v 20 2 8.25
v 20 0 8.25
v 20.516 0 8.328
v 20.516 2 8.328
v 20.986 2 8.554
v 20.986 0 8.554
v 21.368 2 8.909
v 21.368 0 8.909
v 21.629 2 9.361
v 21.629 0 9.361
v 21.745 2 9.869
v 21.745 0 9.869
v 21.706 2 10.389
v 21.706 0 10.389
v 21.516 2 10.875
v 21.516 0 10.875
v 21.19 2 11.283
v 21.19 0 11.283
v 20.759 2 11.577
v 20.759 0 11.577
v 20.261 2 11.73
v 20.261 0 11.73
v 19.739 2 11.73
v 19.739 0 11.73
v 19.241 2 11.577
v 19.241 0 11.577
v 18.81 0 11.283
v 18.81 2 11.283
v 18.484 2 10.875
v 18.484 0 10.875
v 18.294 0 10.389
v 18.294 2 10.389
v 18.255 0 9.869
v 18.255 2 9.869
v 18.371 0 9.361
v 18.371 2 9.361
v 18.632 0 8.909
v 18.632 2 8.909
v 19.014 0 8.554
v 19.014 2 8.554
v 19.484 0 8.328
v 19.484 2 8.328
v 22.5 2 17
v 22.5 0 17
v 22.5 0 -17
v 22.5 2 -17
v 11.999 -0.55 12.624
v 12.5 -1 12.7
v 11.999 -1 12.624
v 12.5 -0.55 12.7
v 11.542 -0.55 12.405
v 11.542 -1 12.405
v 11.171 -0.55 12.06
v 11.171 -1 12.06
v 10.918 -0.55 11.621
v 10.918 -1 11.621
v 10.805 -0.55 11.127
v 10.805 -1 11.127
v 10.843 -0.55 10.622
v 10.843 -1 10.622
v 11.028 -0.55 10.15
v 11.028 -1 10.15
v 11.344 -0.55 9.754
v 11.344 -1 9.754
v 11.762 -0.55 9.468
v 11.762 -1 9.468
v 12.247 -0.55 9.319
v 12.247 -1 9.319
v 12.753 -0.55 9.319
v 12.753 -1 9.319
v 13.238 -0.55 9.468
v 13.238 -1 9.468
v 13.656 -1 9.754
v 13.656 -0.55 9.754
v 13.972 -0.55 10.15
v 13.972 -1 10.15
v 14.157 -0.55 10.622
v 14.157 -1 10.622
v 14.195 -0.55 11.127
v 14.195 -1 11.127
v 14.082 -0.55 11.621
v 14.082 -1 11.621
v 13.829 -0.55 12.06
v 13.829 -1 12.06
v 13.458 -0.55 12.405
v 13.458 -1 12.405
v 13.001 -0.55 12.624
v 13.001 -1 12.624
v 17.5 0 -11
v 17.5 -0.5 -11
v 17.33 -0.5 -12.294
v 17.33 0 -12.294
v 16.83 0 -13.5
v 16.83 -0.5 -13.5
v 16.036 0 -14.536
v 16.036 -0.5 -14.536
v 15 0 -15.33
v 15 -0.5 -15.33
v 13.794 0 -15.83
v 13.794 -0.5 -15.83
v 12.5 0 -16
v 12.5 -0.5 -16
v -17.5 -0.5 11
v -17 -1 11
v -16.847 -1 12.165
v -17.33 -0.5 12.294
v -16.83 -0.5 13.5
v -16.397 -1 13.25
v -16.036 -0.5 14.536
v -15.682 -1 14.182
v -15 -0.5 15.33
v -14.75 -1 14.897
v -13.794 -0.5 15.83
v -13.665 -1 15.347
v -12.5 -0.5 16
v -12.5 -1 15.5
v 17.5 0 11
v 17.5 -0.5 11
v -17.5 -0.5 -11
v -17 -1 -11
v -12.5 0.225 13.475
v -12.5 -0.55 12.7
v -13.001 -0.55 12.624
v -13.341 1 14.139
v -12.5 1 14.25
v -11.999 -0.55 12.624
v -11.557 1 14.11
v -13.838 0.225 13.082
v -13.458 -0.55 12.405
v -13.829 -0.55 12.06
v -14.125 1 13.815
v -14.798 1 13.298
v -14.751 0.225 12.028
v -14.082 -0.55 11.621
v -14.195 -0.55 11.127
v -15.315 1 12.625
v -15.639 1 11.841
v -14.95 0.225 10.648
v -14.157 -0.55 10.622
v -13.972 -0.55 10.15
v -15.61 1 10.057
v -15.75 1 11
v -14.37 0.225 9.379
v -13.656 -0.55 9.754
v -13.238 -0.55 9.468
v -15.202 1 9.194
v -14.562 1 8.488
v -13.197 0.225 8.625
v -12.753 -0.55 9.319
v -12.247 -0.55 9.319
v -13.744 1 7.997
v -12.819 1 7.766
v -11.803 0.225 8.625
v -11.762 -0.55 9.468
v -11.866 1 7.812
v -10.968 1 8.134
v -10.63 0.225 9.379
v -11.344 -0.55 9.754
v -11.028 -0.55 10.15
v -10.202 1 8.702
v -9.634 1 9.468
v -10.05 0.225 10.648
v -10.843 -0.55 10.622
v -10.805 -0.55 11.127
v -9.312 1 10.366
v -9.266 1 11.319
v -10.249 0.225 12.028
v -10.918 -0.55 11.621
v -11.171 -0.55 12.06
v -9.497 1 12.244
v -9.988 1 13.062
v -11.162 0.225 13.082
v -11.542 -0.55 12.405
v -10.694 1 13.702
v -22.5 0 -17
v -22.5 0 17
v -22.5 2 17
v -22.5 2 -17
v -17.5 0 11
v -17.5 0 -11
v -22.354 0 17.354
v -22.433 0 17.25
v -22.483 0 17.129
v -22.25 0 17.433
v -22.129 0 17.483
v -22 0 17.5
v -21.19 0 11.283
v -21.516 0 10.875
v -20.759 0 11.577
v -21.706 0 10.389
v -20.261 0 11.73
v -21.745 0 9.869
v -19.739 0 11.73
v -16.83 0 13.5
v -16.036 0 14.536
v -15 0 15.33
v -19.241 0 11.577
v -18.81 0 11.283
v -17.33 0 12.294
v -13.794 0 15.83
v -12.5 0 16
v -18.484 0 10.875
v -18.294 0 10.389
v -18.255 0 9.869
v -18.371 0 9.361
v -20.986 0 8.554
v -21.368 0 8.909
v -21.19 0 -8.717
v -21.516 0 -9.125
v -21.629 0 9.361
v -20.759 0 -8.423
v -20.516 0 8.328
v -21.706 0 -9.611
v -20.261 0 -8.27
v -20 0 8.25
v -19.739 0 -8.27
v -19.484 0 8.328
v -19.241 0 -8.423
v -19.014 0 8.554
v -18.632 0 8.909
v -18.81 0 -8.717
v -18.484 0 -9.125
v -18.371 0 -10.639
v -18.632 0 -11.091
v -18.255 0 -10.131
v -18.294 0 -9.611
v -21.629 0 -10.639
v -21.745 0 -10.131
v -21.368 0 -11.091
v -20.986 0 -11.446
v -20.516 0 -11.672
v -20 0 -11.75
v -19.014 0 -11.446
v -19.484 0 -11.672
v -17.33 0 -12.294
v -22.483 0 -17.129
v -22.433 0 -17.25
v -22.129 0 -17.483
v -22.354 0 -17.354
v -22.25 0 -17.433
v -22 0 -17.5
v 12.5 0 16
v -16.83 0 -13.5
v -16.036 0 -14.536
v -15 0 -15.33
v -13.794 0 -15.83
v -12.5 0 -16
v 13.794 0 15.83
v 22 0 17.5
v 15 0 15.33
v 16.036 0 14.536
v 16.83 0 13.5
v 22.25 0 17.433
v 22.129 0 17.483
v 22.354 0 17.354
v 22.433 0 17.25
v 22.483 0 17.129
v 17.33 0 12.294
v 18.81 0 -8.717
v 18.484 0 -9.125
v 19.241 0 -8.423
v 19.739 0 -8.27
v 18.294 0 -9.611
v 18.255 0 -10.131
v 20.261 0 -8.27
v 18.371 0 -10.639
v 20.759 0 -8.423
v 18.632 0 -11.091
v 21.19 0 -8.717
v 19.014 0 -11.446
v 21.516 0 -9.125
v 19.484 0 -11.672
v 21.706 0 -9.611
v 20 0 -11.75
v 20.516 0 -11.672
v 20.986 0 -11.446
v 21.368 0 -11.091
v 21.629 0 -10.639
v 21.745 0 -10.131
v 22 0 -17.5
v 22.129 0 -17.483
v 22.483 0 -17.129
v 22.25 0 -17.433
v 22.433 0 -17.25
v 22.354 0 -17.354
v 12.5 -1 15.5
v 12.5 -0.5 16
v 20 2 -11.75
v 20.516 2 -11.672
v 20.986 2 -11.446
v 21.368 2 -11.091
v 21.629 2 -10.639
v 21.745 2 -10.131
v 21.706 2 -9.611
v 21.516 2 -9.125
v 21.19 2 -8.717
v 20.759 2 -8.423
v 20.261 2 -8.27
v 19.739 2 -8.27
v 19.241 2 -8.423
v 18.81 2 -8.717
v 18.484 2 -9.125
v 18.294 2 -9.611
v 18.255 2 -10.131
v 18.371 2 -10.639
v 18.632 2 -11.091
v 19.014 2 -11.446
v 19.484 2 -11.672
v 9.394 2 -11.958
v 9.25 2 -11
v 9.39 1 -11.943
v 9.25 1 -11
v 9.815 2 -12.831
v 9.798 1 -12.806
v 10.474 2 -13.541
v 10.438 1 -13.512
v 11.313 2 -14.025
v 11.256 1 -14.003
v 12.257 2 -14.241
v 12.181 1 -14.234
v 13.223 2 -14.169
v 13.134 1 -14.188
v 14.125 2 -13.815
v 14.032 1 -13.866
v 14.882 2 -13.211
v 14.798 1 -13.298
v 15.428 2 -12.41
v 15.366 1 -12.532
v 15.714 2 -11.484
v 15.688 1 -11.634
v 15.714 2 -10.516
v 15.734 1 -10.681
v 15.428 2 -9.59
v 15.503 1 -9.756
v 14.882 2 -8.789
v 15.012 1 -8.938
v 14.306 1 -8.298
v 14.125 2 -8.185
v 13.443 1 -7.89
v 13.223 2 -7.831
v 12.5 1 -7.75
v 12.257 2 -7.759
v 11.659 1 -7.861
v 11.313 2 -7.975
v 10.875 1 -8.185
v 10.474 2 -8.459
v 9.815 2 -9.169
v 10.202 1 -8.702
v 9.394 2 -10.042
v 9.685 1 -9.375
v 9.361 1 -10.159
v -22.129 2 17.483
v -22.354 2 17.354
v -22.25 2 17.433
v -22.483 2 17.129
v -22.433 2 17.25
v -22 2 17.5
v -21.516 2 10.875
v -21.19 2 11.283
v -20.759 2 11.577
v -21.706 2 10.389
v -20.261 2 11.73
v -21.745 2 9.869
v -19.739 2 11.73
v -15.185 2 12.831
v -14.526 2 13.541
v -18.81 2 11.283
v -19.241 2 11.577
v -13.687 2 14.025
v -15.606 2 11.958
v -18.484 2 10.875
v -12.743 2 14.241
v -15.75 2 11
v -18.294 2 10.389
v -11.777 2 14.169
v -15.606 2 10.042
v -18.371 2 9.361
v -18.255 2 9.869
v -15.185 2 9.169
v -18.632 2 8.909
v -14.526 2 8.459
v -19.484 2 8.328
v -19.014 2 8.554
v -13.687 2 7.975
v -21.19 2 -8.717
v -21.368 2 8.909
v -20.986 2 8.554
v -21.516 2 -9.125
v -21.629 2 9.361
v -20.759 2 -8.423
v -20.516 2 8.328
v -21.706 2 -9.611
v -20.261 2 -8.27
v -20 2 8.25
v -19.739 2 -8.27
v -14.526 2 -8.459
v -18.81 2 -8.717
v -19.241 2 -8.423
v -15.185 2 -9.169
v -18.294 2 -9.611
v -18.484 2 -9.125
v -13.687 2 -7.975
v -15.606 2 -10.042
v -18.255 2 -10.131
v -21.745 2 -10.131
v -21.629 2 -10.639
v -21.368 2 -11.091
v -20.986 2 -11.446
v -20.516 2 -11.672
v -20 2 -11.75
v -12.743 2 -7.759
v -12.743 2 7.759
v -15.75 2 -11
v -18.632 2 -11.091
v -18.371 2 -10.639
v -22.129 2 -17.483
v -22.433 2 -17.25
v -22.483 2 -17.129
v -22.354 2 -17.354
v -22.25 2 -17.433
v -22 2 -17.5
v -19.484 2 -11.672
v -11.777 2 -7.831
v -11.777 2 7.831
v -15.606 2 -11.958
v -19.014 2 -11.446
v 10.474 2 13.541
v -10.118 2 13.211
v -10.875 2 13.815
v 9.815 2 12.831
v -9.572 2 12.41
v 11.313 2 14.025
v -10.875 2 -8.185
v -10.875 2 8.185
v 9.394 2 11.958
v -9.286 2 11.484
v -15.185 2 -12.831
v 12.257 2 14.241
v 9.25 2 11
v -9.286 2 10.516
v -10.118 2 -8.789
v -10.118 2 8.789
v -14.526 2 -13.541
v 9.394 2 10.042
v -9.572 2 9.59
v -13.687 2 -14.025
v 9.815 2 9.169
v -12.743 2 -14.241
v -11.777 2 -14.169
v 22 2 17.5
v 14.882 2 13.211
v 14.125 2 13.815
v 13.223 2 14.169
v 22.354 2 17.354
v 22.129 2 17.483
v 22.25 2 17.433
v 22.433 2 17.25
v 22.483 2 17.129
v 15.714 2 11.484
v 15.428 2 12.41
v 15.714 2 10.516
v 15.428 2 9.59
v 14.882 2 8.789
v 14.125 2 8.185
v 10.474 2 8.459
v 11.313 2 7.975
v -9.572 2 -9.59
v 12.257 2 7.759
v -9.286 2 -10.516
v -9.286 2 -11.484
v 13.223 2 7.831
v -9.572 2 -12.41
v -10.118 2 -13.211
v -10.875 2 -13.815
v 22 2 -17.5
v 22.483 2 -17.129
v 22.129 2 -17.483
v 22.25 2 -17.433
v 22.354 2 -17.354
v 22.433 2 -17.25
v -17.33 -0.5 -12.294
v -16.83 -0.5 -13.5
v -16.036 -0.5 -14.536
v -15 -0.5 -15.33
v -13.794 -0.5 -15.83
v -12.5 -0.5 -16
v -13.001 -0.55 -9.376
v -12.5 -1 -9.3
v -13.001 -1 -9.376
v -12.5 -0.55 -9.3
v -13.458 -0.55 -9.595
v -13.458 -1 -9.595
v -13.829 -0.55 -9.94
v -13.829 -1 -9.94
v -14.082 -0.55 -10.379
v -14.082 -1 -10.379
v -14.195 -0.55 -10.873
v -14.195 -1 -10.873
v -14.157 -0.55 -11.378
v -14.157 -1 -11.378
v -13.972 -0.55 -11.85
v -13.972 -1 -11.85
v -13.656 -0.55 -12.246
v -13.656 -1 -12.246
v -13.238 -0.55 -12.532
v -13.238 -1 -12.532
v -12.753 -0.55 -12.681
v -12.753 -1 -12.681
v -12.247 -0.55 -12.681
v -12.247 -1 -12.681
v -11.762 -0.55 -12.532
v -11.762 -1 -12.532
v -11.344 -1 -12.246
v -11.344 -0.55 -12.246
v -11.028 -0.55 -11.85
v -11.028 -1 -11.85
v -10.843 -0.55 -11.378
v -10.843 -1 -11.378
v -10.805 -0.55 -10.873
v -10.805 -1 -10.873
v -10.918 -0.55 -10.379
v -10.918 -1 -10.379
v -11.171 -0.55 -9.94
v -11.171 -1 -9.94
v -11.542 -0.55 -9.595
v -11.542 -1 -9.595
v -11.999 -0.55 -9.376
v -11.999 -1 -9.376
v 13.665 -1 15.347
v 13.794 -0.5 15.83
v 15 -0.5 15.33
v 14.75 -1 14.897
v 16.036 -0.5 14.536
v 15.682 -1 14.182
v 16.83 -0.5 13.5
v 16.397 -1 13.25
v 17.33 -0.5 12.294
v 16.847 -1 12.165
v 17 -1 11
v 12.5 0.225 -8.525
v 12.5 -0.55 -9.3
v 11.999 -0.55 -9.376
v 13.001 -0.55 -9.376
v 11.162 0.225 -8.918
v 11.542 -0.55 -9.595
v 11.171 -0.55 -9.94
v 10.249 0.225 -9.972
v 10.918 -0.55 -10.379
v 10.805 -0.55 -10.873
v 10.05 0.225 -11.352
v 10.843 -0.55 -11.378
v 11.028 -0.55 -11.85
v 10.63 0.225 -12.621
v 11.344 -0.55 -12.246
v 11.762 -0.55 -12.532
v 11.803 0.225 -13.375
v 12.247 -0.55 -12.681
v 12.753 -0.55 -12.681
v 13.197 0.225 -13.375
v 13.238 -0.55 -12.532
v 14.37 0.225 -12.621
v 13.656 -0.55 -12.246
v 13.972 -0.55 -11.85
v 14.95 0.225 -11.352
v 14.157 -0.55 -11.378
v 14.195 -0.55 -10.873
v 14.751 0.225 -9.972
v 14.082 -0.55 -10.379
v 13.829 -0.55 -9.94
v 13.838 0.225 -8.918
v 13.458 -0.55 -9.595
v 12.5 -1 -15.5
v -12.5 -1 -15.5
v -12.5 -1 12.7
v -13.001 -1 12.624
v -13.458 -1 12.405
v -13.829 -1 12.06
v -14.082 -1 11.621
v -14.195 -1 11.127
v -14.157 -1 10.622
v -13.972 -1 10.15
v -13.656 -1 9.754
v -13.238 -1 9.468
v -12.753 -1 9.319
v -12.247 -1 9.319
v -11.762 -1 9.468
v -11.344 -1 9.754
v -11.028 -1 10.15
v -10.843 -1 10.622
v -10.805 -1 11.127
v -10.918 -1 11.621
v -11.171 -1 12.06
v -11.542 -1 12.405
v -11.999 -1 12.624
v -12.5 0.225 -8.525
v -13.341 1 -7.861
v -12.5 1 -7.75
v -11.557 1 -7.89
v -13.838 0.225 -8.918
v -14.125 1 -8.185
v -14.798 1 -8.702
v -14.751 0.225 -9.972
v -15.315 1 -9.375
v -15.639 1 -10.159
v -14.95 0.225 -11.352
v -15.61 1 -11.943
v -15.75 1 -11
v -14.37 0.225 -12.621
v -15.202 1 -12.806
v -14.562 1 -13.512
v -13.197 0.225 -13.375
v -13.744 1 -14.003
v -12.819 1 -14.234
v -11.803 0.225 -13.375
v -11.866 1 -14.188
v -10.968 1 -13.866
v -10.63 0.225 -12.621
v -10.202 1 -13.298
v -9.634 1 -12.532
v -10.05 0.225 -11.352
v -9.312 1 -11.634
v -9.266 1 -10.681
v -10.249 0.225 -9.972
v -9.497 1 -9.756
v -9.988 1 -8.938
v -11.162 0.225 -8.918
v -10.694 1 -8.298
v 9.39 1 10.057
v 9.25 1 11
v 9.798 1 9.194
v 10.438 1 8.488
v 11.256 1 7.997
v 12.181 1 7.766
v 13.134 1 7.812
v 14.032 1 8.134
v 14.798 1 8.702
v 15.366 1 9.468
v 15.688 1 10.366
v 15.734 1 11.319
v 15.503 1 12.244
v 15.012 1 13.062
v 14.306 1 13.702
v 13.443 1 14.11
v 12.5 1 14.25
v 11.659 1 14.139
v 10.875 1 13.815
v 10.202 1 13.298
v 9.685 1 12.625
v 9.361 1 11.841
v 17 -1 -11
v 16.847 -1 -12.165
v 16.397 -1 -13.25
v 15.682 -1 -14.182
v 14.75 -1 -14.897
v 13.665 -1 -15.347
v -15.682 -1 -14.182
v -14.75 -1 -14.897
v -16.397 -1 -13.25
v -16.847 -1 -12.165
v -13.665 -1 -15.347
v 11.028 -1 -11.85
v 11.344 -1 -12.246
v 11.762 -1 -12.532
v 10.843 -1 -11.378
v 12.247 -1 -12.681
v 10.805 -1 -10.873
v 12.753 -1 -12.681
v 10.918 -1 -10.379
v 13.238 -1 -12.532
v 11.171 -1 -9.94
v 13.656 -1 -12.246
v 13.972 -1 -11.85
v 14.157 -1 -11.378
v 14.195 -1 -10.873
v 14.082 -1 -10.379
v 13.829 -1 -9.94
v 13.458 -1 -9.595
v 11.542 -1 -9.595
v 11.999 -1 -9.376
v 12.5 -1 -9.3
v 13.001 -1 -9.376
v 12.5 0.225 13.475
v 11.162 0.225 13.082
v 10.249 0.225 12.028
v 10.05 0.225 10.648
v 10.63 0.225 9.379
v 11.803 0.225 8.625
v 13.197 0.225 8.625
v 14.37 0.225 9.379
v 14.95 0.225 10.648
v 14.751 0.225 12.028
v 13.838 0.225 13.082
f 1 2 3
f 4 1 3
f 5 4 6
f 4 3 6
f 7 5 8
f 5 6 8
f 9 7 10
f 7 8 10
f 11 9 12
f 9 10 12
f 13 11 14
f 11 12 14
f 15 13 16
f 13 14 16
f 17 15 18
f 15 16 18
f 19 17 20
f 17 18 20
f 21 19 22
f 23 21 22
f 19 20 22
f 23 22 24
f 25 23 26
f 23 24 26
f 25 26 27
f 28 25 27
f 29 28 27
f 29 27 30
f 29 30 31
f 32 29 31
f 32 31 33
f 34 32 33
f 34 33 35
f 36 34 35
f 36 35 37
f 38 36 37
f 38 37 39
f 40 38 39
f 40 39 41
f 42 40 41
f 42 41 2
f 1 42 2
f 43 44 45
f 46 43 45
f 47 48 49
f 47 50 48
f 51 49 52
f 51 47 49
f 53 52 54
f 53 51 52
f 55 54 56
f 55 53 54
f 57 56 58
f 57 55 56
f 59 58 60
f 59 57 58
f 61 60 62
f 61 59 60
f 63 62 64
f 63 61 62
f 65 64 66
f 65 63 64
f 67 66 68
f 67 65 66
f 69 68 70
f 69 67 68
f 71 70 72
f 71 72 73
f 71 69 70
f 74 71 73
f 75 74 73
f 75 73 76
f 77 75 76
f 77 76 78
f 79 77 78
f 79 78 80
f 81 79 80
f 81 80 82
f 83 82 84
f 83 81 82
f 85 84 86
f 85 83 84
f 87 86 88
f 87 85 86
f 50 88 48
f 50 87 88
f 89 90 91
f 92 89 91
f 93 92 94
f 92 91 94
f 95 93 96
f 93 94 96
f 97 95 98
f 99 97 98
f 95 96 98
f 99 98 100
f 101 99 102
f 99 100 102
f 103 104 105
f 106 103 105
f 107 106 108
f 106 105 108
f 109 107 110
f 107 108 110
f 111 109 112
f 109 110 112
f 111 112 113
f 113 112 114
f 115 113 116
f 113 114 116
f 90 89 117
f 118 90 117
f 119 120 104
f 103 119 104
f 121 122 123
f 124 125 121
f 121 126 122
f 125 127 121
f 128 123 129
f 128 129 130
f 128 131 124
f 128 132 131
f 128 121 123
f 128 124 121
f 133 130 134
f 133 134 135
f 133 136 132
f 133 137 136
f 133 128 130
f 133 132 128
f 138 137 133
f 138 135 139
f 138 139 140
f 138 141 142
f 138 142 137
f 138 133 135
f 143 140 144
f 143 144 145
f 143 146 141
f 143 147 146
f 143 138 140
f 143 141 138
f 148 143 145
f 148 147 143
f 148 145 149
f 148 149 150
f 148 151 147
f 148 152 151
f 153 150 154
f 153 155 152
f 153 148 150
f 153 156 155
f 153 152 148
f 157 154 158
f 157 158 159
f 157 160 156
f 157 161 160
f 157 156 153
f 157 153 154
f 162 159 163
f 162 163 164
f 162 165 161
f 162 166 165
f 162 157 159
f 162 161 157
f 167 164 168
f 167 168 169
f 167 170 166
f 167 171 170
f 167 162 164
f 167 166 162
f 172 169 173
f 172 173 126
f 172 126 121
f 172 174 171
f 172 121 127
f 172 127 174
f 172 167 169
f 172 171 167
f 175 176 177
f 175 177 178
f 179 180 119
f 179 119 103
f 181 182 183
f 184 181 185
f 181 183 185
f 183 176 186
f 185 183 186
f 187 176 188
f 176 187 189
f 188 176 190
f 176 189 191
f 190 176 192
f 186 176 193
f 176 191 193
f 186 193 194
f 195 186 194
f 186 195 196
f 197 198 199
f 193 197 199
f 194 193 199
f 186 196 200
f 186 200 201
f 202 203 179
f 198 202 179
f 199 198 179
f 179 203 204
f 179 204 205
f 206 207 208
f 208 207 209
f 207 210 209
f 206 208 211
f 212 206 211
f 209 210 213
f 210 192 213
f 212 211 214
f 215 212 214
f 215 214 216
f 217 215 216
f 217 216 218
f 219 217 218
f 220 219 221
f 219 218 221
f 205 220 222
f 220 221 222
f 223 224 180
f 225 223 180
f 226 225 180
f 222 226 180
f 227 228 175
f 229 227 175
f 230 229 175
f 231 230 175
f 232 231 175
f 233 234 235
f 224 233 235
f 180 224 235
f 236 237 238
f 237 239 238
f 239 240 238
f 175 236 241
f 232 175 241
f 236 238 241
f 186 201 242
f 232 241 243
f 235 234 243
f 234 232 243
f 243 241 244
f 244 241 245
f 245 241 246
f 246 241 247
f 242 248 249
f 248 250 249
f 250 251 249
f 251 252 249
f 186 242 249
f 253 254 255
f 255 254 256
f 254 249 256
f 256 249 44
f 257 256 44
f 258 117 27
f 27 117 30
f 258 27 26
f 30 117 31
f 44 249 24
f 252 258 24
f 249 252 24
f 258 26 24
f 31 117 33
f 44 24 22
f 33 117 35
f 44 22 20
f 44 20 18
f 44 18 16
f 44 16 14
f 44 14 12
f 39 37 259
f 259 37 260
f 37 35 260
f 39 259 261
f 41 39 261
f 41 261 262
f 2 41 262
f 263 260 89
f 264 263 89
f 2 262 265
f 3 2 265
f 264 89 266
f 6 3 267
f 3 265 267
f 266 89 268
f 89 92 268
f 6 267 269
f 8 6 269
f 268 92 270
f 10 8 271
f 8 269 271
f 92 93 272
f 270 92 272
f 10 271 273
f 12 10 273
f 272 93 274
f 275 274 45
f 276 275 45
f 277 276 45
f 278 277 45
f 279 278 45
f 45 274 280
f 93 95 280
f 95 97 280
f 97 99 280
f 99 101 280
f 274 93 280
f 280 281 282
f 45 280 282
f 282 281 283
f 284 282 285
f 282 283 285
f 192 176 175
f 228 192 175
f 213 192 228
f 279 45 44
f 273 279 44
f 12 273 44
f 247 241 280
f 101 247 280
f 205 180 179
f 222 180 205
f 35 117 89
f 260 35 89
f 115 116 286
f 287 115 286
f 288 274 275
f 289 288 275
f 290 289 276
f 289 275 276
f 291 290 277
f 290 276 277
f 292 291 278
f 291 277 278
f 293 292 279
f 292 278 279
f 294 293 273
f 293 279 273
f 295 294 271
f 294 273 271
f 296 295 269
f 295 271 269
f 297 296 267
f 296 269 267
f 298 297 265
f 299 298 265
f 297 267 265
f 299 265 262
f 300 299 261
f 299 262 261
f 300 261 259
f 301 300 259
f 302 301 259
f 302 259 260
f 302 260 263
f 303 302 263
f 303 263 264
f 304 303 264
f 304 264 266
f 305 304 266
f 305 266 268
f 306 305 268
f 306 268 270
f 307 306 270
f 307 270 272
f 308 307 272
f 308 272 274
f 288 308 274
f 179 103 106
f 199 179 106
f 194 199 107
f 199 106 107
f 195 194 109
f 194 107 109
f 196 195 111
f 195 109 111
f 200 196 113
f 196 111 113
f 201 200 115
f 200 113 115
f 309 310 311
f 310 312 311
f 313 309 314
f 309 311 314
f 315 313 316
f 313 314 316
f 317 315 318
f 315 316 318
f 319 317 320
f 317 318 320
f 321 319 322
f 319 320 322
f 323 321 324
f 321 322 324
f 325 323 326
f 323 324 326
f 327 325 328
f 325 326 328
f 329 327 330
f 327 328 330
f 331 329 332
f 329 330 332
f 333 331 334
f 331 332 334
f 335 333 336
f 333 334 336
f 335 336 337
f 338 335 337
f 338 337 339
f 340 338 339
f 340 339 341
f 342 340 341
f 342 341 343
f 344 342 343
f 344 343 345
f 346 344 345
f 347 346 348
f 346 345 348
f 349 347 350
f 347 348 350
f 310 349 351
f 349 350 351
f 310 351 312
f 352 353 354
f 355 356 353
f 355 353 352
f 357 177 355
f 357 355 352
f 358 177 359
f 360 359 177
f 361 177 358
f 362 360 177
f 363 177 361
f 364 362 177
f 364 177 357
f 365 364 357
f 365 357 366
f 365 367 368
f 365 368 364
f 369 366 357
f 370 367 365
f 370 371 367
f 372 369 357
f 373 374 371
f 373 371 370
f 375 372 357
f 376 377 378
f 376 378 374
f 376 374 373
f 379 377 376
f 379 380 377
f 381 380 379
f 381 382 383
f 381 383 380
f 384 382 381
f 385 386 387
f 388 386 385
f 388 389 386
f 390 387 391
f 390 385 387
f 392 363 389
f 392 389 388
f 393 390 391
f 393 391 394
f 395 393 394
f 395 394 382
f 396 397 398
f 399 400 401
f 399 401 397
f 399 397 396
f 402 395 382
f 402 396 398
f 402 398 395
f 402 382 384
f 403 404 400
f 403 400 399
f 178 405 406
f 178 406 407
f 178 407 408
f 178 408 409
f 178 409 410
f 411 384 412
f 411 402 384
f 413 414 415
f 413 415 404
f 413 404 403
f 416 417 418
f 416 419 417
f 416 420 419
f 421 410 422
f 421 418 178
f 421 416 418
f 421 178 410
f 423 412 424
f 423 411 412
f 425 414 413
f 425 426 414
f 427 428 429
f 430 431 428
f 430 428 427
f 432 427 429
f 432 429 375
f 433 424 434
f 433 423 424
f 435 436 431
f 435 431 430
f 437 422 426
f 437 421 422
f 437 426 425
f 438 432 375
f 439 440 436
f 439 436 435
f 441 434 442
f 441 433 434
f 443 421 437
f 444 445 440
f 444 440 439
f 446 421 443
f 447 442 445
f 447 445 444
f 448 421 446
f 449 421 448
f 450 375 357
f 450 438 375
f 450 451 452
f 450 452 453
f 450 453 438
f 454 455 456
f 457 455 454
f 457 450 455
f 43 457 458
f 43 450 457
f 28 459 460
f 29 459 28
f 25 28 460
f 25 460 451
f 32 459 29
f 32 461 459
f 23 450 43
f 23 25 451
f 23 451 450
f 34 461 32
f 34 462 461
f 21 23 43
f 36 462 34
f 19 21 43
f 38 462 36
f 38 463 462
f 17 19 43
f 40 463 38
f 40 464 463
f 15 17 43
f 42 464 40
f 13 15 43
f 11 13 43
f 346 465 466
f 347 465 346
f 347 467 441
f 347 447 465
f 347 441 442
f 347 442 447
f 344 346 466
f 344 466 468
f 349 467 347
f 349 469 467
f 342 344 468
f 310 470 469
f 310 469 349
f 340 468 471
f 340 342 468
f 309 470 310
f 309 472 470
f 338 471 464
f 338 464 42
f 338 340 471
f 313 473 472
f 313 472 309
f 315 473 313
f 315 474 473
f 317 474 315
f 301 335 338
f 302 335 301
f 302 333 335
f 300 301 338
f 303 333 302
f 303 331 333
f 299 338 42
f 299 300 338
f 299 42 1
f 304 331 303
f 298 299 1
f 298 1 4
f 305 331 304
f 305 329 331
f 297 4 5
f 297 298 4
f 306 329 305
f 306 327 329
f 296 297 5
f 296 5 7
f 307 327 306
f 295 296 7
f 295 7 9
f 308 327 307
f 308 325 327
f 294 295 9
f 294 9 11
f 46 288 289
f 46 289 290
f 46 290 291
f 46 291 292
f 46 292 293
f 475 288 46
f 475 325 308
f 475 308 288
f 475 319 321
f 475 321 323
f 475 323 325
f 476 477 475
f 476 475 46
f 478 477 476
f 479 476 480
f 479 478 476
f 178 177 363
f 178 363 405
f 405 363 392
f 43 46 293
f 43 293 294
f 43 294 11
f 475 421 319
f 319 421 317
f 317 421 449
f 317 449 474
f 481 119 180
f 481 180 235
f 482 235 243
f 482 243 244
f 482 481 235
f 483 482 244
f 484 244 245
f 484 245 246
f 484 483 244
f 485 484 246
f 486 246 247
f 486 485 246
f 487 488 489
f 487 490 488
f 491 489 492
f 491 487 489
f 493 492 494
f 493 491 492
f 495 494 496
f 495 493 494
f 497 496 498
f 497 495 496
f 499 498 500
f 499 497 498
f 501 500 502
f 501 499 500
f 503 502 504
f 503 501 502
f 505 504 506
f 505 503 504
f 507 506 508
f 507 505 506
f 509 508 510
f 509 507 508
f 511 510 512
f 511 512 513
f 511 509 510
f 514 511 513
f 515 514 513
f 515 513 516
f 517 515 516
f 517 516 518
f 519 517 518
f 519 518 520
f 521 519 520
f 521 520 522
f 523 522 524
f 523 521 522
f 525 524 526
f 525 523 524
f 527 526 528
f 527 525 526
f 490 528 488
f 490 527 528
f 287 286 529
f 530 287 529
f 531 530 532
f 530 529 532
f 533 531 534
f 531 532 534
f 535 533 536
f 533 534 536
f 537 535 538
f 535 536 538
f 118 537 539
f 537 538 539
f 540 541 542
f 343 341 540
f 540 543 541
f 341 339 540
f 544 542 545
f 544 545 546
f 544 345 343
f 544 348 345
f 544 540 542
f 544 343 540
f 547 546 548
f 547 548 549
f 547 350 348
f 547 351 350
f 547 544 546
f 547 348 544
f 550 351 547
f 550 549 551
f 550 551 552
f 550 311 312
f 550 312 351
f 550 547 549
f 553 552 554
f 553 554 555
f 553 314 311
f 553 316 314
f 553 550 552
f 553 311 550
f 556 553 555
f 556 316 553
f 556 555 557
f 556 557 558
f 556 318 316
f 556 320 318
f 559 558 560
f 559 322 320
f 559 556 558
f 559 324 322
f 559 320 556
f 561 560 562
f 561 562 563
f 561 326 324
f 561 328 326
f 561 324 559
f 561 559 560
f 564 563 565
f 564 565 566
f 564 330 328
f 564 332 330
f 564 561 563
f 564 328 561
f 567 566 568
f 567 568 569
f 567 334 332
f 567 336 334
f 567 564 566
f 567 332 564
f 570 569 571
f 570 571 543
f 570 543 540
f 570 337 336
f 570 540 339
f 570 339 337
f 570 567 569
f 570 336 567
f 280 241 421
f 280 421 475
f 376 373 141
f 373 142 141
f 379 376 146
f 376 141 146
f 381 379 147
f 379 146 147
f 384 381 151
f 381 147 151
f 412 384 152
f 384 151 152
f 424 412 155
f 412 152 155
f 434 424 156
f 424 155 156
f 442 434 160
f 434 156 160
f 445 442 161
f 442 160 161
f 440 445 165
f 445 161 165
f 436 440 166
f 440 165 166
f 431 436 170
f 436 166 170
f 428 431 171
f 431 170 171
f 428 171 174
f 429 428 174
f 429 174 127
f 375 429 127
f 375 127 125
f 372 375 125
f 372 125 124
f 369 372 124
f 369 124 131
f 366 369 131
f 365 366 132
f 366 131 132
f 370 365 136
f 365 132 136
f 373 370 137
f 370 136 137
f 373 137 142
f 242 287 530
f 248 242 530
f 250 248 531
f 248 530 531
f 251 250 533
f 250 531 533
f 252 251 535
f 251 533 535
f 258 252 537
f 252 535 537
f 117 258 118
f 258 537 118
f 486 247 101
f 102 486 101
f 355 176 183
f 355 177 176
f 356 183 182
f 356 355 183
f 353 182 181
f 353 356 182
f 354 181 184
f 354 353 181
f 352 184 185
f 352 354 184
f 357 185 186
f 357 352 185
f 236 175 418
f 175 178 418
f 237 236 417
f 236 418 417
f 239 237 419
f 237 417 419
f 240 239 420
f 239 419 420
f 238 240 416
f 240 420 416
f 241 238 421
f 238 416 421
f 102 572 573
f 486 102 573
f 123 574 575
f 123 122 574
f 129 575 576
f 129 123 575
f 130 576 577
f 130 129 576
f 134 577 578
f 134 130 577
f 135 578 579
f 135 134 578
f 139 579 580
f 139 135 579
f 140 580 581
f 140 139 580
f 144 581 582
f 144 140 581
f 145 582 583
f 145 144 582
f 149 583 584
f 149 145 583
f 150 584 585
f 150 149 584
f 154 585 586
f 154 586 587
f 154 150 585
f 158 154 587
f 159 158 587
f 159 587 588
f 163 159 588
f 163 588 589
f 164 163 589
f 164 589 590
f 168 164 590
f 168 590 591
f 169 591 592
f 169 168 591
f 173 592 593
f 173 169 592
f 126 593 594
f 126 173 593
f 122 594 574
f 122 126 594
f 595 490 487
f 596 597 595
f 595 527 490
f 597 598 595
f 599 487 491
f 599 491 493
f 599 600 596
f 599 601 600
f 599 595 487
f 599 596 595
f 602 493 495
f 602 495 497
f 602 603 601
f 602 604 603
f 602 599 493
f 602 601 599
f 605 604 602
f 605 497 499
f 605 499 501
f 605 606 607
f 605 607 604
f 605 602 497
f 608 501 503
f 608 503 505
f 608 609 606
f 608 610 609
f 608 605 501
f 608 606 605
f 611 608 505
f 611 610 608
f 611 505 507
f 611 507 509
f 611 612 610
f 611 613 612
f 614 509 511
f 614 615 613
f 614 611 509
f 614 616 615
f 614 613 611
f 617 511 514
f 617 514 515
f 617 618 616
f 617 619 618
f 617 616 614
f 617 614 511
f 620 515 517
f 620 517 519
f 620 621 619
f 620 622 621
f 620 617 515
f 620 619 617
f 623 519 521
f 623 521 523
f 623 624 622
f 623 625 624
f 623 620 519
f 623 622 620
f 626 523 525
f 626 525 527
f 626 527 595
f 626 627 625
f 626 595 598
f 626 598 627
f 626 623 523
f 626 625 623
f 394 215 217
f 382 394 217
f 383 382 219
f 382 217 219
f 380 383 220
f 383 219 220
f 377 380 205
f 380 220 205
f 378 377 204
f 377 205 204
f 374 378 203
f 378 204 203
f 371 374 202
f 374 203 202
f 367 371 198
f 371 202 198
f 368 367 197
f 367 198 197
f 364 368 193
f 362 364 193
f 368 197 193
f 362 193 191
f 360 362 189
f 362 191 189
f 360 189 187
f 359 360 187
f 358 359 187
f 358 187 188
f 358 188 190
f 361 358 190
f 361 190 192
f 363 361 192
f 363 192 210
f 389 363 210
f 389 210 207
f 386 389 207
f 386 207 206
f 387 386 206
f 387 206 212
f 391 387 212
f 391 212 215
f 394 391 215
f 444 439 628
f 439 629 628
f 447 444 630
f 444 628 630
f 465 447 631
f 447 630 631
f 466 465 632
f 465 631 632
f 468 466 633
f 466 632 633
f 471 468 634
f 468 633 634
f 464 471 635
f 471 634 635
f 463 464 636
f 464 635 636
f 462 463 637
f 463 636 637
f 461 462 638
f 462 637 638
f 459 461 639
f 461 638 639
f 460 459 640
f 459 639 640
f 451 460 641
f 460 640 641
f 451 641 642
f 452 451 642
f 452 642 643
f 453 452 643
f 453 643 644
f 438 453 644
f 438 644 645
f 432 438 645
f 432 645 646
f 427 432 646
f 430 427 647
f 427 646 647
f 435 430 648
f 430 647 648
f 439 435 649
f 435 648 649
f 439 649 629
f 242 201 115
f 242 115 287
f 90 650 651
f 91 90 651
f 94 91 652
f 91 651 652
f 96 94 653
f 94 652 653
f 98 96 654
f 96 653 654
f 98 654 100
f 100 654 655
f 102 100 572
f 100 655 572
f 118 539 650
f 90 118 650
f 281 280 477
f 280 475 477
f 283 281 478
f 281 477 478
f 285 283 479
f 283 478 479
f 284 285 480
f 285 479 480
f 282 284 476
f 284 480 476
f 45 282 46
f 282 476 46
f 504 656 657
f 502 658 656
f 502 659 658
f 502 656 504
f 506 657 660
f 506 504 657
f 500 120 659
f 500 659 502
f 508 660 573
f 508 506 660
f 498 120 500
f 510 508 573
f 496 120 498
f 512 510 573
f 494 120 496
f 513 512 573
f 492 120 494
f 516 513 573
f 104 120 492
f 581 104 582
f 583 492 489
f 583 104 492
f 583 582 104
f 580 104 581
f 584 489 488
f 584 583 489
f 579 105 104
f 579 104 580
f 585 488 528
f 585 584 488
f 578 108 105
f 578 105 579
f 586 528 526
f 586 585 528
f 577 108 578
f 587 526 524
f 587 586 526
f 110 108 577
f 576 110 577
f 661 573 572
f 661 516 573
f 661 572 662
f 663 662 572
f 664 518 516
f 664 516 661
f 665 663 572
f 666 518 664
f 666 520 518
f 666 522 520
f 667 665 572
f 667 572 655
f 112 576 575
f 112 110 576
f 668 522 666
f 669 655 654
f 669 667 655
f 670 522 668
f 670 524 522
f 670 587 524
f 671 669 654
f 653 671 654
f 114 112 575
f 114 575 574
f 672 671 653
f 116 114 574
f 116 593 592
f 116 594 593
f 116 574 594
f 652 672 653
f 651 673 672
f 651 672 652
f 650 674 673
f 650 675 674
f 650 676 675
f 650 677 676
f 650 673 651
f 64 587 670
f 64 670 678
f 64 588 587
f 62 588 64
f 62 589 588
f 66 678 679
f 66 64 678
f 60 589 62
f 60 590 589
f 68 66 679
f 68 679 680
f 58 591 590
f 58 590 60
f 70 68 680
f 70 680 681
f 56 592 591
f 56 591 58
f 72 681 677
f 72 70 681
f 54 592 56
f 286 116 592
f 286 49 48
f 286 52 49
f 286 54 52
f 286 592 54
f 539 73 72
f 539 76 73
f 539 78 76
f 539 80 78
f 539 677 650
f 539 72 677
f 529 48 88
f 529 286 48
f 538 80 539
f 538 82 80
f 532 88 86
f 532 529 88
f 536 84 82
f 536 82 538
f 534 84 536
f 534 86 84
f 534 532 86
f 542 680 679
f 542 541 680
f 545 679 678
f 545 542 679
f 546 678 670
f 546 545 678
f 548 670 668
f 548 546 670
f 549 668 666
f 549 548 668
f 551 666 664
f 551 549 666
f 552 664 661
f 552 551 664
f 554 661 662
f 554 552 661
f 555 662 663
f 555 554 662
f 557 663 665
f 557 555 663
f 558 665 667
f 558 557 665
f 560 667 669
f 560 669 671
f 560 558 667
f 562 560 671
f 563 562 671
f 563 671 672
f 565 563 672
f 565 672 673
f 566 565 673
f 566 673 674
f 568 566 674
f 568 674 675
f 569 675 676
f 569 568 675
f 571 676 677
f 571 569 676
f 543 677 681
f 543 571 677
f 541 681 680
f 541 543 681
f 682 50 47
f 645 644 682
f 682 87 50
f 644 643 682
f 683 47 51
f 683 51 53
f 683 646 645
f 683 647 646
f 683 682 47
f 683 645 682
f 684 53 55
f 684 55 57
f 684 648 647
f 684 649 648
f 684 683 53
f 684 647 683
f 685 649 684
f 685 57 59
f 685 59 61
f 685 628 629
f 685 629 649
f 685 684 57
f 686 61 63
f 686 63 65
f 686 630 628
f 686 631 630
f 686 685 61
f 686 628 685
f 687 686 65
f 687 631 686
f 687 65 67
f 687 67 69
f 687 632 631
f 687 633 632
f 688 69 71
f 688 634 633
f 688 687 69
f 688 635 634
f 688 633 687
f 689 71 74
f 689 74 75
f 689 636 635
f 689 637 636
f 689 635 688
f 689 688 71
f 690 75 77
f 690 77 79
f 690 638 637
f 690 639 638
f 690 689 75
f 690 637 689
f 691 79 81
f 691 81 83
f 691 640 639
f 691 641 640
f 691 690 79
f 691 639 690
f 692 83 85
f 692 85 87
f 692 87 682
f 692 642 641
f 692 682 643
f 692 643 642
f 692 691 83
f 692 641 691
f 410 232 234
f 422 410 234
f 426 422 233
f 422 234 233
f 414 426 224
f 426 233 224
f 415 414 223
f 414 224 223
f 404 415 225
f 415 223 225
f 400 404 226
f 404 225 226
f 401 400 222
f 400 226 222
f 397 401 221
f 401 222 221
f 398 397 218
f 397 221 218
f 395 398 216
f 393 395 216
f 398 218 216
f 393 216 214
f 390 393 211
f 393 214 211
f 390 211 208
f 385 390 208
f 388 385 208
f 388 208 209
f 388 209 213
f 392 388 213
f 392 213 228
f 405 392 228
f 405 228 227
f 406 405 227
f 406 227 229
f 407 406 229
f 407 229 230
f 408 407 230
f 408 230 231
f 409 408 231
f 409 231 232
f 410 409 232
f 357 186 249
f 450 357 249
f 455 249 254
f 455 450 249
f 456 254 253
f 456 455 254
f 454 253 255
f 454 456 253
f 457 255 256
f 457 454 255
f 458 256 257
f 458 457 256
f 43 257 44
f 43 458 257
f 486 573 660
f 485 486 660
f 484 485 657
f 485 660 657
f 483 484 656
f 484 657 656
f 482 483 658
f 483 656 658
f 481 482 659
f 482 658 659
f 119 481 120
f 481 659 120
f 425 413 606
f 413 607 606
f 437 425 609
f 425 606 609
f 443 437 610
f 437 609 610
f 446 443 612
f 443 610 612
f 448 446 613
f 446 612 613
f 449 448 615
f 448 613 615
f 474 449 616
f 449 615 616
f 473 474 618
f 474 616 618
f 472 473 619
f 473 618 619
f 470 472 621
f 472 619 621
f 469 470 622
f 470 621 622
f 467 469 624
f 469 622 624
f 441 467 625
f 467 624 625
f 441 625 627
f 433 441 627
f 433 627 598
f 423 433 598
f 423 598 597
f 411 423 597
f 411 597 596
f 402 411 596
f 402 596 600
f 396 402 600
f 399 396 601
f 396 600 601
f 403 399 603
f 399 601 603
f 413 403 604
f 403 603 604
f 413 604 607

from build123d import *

# Parameters (mm, degrees)
ESQUISSE1_W                              = 45
ESQUISSE1_H                              = 35
BOSS_EXTRU_1_DEPTH                       = 2
ESQUISSE2_W                              = 35
ESQUISSE2_H                              = 32
BOSS_EXTRU_2_DEPTH                       = 1
CONG_1_R                                 = 5
CONG_2_R                                 = 0.5
CHANFREIN1_SIZE                          = 0.5
ESQUISSE3_R                              = 1.75
ENL_V_MAT_EXTRU_1_DEPTH                  = 29.574464124
DIAM_TRE_DU_PER_AGE_6_5_6_5_1_D          = 6.5
DIAM_TRE_DU_PER_AGE_6_5_6_5_1_DEPTH      = 1
FRAISAGE_POUR_VIS_T_TE_FRAIS_E_6_2_COUNT = 2
FRAISAGE_POUR_VIS_T_TE_FRAIS_E_6_2_PITCH = 33.301651611
FRAISAGE_POUR_VIS_T_TE_FRAIS_E_6_3_COUNT = 2
FRAISAGE_POUR_VIS_T_TE_FRAIS_E_6_3_PITCH = 22
FRAISAGE_POUR_VIS_T_TE_FRAIS_E_6_4_COUNT = 2
FRAISAGE_POUR_VIS_T_TE_FRAIS_E_6_4_PITCH = 25


with BuildPart() as part:
    # Esquisse1 → Boss.-Extru.1 (new body)
    with BuildSketch(Plane(origin=(0, 0, 0), x_dir=(1, 0, 0), z_dir=(0, 1, 0))):
        Rectangle(ESQUISSE1_W, ESQUISSE1_H)
    extrude(amount=BOSS_EXTRU_1_DEPTH)

    # Esquisse2 → Boss.-Extru.2 (add)
    with BuildSketch(Plane.XZ):
        Rectangle(ESQUISSE2_W, ESQUISSE2_H)
    extrude(amount=BOSS_EXTRU_2_DEPTH)

    # Congé1
    cong_1_edges = [part.edges().sort_by_distance(p)[0] for p in [
        (17.5, -0.5, -16),
        (17.5, -0.5, 16),
        (-17.5, -0.5, 16),
        (-17.5, -0.5, -16),
    ]]
    fillet(cong_1_edges, radius=CONG_1_R)

    # Congé2
    cong_2_edges = [part.edges().sort_by_distance(p)[0] for p in [
        (22.5, 1, 17.5),
        (-22.5, 1, 17.5),
        (-22.5, 1, -17.5),
        (22.5, 1, -17.5),
    ]]
    fillet(cong_2_edges, radius=CONG_2_R)

    # Chanfrein1
    chanfrein1_edges = [part.edges().sort_by_distance(p)[0] for p in [
        (0, -1, 16),
        (17.5, -1, 0),
        (-17.5, -1, 0),
        (0, -1, -16),
        (-16.035533906, -1, 14.535533906),
        (16.035533906, -1, -14.535533906),
        (-16.035533906, -1, -14.535533906),
        (16.035533906, -1, 14.535533906),
    ]]
    chamfer(chanfrein1_edges, length=CHANFREIN1_SIZE)

    # Esquisse3 → Enlèv. mat.-Extru.1 (cut, through all)
    with BuildSketch(Plane.XZ):
        with Locations(Location((-20, 10, 0), (0, 0, 270))):
            Circle(ESQUISSE3_R)
        with Locations(Location((20, 10, 0), (0, 0, 270))):
            Circle(ESQUISSE3_R)
        with Locations(Location((20, -10, 0), (0, 0, 270))):
            Circle(ESQUISSE3_R)
        with Locations(Location((-20, -10, 0), (0, 0, 270))):
            Circle(ESQUISSE3_R)
    extrude(amount=-ENL_V_MAT_EXTRU_1_DEPTH, mode=Mode.SUBTRACT)

    # Diamètre du perçage Ø6.5 (6.5)1
    with Locations(Plane(origin=(0, 2, 0), x_dir=(1, 0, 0), z_dir=(0, 1, 0))):
        with Locations((-12.5, -11), (12.5, 11), (-12.5, 11), (12.5, -11)):
            Hole(DIAM_TRE_DU_PER_AGE_6_5_6_5_1_D / 2, depth=DIAM_TRE_DU_PER_AGE_6_5_6_5_1_DEPTH)

    # Esquisse4 → Fraisage pour vis à tête fraisée à 6 pans creux M31 (revolve, cut)
    with BuildSketch(Plane(origin=(-12.5, 1, -11), x_dir=(0, 0, 1), z_dir=(1, 0, 0))):
        Polygon((0, 0), (0, 2), (1.7, 2), (1.7, 1.55), (3.25, 0), align=None)
    fraisage_pour_vis_t_te_frais_e_6_pan = revolve(axis=Axis((-12.5, 7.35, -11), (0, -1, 0)), mode=Mode.SUBTRACT)

    # Fraisage pour vis _ t_te frais_e _ 6 2: Fraisage pour vis à tête fraisée à 6 pans creux M31 ×2
    with Locations(*[Vector(0.7507135169227553, 0, 0.6606278948920248) * (i * FRAISAGE_POUR_VIS_T_TE_FRAIS_E_6_2_PITCH) for i in range(1, FRAISAGE_POUR_VIS_T_TE_FRAIS_E_6_2_COUNT)]):
        add(fraisage_pour_vis_t_te_frais_e_6_pan, mode=Mode.SUBTRACT)

    # Fraisage pour vis _ t_te frais_e _ 6 3: Fraisage pour vis à tête fraisée à 6 pans creux M31 ×2
    with Locations(*[(0, 0, i * FRAISAGE_POUR_VIS_T_TE_FRAIS_E_6_3_PITCH) for i in range(1, FRAISAGE_POUR_VIS_T_TE_FRAIS_E_6_3_COUNT)]):
        add(fraisage_pour_vis_t_te_frais_e_6_pan, mode=Mode.SUBTRACT)

    # Fraisage pour vis _ t_te frais_e _ 6 4: Fraisage pour vis à tête fraisée à 6 pans creux M31 ×2
    with Locations(*[(i * FRAISAGE_POUR_VIS_T_TE_FRAIS_E_6_4_PITCH, 0, 0) for i in range(1, FRAISAGE_POUR_VIS_T_TE_FRAIS_E_6_4_COUNT)]):
        add(fraisage_pour_vis_t_te_frais_e_6_pan, mode=Mode.SUBTRACT)


solid = part.part
